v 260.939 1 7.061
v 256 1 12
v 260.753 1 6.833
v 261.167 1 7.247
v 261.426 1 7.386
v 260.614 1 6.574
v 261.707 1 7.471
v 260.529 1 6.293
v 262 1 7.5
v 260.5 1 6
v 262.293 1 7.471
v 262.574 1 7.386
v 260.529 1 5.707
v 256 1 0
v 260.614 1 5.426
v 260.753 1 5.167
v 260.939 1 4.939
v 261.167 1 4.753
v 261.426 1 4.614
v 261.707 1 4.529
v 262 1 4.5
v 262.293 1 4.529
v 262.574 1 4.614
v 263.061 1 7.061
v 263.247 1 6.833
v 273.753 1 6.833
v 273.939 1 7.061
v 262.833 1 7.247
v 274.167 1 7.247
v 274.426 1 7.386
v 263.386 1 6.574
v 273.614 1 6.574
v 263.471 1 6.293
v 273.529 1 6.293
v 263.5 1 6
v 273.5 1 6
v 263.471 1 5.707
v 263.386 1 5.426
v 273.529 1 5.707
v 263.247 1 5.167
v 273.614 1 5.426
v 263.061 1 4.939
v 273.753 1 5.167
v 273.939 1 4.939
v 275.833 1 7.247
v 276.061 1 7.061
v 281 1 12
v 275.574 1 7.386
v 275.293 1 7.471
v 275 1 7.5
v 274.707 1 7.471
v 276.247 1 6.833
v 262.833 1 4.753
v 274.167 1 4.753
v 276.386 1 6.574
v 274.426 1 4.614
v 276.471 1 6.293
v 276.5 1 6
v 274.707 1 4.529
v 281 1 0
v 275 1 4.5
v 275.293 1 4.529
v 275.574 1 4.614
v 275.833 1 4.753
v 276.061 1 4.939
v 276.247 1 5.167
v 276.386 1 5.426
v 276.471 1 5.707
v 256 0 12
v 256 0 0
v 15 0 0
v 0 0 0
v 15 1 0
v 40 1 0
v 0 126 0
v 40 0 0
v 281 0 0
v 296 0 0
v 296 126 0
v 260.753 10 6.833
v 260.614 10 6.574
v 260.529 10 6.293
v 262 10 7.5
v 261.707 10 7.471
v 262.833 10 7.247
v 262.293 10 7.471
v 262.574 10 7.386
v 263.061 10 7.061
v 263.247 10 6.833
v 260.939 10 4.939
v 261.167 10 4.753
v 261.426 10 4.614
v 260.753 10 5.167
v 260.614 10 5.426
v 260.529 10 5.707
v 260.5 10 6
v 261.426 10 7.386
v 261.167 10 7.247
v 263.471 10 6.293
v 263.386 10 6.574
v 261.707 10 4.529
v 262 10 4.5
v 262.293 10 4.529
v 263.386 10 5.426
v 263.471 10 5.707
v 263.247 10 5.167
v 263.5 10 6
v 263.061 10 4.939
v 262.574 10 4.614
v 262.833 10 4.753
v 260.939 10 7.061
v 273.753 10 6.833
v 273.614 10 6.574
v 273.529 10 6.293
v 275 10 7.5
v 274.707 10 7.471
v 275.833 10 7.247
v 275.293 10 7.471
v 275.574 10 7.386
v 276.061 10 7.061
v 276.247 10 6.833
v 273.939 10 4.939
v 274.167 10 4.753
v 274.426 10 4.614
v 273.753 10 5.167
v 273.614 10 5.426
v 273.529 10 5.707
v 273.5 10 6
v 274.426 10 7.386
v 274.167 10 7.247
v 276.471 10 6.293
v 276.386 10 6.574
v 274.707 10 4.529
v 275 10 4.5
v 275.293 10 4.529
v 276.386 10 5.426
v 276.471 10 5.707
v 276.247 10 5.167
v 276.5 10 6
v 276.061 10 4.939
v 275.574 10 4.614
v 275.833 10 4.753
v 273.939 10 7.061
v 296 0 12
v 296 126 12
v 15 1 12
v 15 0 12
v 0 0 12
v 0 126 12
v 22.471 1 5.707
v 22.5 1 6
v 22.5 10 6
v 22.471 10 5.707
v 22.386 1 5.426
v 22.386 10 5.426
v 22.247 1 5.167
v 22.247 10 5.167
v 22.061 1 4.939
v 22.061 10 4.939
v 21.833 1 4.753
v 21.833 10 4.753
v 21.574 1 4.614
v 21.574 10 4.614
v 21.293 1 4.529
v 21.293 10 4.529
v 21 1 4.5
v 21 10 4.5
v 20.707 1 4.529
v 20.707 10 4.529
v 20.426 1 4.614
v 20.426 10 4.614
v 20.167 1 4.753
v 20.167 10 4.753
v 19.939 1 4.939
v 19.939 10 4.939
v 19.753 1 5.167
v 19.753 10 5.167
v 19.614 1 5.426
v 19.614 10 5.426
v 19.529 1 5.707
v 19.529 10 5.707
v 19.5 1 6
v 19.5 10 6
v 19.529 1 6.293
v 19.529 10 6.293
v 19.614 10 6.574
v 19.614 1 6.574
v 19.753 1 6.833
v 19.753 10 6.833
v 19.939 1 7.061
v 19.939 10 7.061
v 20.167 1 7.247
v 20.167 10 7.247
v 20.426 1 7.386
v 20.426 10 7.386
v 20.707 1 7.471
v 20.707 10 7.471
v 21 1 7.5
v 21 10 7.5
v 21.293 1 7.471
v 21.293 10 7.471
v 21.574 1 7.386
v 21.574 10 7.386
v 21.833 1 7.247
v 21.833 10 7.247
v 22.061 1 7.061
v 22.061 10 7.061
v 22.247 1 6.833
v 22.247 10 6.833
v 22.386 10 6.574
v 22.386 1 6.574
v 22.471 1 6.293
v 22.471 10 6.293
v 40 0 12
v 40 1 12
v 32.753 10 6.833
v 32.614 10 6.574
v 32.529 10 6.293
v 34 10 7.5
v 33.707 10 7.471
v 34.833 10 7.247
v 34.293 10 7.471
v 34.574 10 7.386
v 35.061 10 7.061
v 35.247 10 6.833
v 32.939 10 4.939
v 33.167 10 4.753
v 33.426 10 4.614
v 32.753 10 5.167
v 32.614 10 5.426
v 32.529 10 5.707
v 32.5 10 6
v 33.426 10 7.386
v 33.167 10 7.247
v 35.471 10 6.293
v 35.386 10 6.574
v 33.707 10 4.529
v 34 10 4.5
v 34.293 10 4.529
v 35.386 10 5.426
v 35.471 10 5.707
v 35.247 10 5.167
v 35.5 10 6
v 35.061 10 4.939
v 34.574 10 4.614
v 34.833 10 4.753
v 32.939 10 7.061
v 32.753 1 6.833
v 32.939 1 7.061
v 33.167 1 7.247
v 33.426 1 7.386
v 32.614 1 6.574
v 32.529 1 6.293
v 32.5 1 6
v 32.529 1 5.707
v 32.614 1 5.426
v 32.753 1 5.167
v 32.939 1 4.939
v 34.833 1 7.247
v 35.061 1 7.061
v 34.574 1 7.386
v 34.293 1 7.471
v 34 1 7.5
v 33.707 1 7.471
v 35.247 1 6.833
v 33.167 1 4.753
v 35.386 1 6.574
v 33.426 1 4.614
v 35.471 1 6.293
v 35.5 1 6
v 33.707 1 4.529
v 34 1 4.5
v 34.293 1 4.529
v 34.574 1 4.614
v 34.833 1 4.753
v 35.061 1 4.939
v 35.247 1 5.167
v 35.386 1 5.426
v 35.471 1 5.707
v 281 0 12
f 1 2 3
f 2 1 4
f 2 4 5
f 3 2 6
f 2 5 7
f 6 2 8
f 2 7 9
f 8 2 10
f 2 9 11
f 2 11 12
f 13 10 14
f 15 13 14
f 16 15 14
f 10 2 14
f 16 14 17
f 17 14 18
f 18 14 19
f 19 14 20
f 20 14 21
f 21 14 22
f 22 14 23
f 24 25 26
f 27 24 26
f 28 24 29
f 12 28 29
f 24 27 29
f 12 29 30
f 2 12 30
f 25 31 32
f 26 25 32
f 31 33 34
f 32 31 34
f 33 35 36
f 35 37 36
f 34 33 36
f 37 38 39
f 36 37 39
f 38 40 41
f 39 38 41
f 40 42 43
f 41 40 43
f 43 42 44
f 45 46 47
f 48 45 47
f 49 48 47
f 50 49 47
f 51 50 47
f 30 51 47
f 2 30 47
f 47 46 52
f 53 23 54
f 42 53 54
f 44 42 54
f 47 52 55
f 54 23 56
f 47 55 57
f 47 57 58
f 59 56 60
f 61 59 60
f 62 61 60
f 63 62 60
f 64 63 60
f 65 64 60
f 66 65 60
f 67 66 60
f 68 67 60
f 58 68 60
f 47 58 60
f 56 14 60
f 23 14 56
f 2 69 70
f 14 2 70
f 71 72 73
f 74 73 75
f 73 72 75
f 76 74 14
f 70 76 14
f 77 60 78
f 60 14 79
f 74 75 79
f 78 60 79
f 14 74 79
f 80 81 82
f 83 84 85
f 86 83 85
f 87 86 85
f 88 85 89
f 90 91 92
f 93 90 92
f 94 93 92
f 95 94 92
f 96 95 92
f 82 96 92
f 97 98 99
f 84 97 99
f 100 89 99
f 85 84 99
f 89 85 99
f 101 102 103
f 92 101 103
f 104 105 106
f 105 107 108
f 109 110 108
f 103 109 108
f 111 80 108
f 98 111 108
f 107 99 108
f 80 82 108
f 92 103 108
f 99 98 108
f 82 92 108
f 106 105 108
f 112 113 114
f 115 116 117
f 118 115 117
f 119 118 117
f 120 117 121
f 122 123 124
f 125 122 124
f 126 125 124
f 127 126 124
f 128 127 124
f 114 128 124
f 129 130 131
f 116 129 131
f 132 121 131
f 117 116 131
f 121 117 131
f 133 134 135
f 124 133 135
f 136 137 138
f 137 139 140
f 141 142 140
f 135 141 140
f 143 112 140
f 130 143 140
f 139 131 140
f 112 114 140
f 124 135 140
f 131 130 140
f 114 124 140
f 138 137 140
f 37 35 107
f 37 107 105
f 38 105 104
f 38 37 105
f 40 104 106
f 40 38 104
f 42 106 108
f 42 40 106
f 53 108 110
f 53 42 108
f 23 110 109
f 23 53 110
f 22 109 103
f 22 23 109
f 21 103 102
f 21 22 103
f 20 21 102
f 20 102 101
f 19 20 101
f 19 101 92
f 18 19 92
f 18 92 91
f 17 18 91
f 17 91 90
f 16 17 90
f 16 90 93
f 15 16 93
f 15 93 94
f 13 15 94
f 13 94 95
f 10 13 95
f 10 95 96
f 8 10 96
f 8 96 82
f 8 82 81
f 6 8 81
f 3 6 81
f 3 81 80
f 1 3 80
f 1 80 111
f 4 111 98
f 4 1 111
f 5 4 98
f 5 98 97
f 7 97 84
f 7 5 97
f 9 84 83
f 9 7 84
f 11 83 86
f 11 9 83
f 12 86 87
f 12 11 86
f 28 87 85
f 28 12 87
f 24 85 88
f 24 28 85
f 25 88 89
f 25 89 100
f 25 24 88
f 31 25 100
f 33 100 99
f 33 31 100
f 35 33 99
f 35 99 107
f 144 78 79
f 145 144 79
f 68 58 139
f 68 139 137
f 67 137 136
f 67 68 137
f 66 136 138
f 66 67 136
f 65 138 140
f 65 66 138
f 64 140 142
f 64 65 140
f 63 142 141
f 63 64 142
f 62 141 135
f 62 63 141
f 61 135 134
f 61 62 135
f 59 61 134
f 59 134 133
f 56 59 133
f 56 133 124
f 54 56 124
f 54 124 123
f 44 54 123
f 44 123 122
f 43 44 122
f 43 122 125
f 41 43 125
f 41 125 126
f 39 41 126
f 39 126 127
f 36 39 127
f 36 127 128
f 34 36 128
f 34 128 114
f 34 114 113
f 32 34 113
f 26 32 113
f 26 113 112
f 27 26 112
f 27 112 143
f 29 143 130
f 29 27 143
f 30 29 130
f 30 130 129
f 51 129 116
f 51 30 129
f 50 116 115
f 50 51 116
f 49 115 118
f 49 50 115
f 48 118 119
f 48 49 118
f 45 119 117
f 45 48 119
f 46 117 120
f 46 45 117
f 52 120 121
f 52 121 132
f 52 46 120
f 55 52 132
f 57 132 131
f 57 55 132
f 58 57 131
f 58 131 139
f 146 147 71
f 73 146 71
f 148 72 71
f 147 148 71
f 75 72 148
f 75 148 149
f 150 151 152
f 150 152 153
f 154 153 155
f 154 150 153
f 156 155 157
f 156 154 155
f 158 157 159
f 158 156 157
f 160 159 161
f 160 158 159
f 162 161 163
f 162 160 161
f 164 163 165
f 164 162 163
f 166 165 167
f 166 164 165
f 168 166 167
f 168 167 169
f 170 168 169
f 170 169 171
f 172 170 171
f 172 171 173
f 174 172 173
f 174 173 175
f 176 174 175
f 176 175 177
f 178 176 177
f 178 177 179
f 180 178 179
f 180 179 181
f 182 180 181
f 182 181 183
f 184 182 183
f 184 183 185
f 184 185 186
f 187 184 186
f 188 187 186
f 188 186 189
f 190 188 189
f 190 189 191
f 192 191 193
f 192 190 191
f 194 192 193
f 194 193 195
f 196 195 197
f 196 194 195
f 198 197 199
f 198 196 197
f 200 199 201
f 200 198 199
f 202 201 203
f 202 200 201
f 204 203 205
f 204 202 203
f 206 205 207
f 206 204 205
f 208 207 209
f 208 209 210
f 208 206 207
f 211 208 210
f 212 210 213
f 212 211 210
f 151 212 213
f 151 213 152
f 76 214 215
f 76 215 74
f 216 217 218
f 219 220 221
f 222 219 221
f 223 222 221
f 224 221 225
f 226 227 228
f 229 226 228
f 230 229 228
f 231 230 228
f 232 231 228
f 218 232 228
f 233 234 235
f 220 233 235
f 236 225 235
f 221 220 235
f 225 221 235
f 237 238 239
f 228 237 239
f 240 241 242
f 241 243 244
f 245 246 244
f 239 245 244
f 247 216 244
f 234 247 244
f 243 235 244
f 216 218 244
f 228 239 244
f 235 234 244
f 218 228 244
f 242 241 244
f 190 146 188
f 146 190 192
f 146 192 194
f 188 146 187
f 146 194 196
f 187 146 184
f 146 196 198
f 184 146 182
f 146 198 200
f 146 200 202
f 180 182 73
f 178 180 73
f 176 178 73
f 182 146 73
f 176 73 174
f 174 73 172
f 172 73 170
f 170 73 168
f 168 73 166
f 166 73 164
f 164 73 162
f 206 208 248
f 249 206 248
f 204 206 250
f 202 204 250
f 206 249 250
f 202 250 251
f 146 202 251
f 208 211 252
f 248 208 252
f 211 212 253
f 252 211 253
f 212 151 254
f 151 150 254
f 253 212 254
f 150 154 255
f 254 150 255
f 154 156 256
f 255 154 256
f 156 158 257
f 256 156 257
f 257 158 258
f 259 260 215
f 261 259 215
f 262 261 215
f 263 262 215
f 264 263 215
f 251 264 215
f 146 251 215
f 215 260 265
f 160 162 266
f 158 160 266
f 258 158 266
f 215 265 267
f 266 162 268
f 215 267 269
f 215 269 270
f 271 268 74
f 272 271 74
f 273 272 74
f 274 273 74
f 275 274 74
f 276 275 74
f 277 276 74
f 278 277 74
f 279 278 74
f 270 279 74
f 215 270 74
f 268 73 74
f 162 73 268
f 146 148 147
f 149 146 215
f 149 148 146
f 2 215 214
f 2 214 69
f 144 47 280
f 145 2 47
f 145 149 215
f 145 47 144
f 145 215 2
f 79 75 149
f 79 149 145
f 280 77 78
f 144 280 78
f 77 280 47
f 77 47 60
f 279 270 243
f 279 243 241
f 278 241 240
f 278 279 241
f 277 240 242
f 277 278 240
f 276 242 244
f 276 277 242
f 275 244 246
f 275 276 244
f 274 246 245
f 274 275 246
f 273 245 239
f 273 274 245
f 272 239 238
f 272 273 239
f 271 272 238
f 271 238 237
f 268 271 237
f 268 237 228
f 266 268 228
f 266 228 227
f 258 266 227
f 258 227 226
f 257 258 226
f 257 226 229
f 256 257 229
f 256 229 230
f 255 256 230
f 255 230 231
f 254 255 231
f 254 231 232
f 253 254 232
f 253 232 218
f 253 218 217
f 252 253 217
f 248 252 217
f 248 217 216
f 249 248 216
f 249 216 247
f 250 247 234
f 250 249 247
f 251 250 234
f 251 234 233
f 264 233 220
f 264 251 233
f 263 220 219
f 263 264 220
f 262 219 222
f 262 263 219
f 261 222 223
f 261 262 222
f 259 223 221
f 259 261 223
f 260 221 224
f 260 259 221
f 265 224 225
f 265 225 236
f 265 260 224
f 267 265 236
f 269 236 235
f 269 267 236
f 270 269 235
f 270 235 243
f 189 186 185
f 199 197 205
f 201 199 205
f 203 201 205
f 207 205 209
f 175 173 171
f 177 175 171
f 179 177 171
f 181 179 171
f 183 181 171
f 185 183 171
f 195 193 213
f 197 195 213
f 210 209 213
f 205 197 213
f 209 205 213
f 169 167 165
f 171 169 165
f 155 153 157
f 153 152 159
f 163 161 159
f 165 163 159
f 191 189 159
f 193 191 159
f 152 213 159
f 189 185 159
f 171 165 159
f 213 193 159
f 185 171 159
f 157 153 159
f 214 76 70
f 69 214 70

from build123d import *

# Parameters (mm, degrees)
SKETCH1_W           = 296
SKETCH1_H           = 126
BOSS_EXTRUDE1_DEPTH = 12
SKETCH2_R           = 1.5
CUT_EXTRUDE1_DEPTH  = 10
SKETCH3_W           = 25
SKETCH3_H           = 12
CUT_EXTRUDE2_DEPTH  = 1


with BuildPart() as part:
    # Sketch1 → Boss-Extrude1 (new body)
    with BuildSketch(Plane.XY):
        with Locations((148, 63)):
            Rectangle(SKETCH1_W, SKETCH1_H)
    extrude(amount=BOSS_EXTRUDE1_DEPTH)

    # Sketch2 → Cut-Extrude1 (cut)
    with BuildSketch(Plane(origin=(0, 0, 0), x_dir=(1, 0, 0), z_dir=(0, 1, 0))):
        with Locations((21, -6)):
            Circle(SKETCH2_R)
        with Locations((34, -6)):
            Circle(SKETCH2_R)
        with Locations((275, -6)):
            Circle(SKETCH2_R)
        with Locations((262, -6)):
            Circle(SKETCH2_R)
    extrude(amount=CUT_EXTRUDE1_DEPTH, mode=Mode.SUBTRACT)

    # Sketch3 → Cut-Extrude2 (cut)
    with BuildSketch(Plane(origin=(0, 0, 0), x_dir=(1, 0, 0), z_dir=(0, 1, 0))):
        with Locations((27.5, -6)):
            Rectangle(SKETCH3_W, SKETCH3_H)
        with Locations((268.5, -6)):
            Rectangle(SKETCH3_W, SKETCH3_H)
    extrude(amount=CUT_EXTRUDE2_DEPTH, mode=Mode.SUBTRACT)


solid = part.part
